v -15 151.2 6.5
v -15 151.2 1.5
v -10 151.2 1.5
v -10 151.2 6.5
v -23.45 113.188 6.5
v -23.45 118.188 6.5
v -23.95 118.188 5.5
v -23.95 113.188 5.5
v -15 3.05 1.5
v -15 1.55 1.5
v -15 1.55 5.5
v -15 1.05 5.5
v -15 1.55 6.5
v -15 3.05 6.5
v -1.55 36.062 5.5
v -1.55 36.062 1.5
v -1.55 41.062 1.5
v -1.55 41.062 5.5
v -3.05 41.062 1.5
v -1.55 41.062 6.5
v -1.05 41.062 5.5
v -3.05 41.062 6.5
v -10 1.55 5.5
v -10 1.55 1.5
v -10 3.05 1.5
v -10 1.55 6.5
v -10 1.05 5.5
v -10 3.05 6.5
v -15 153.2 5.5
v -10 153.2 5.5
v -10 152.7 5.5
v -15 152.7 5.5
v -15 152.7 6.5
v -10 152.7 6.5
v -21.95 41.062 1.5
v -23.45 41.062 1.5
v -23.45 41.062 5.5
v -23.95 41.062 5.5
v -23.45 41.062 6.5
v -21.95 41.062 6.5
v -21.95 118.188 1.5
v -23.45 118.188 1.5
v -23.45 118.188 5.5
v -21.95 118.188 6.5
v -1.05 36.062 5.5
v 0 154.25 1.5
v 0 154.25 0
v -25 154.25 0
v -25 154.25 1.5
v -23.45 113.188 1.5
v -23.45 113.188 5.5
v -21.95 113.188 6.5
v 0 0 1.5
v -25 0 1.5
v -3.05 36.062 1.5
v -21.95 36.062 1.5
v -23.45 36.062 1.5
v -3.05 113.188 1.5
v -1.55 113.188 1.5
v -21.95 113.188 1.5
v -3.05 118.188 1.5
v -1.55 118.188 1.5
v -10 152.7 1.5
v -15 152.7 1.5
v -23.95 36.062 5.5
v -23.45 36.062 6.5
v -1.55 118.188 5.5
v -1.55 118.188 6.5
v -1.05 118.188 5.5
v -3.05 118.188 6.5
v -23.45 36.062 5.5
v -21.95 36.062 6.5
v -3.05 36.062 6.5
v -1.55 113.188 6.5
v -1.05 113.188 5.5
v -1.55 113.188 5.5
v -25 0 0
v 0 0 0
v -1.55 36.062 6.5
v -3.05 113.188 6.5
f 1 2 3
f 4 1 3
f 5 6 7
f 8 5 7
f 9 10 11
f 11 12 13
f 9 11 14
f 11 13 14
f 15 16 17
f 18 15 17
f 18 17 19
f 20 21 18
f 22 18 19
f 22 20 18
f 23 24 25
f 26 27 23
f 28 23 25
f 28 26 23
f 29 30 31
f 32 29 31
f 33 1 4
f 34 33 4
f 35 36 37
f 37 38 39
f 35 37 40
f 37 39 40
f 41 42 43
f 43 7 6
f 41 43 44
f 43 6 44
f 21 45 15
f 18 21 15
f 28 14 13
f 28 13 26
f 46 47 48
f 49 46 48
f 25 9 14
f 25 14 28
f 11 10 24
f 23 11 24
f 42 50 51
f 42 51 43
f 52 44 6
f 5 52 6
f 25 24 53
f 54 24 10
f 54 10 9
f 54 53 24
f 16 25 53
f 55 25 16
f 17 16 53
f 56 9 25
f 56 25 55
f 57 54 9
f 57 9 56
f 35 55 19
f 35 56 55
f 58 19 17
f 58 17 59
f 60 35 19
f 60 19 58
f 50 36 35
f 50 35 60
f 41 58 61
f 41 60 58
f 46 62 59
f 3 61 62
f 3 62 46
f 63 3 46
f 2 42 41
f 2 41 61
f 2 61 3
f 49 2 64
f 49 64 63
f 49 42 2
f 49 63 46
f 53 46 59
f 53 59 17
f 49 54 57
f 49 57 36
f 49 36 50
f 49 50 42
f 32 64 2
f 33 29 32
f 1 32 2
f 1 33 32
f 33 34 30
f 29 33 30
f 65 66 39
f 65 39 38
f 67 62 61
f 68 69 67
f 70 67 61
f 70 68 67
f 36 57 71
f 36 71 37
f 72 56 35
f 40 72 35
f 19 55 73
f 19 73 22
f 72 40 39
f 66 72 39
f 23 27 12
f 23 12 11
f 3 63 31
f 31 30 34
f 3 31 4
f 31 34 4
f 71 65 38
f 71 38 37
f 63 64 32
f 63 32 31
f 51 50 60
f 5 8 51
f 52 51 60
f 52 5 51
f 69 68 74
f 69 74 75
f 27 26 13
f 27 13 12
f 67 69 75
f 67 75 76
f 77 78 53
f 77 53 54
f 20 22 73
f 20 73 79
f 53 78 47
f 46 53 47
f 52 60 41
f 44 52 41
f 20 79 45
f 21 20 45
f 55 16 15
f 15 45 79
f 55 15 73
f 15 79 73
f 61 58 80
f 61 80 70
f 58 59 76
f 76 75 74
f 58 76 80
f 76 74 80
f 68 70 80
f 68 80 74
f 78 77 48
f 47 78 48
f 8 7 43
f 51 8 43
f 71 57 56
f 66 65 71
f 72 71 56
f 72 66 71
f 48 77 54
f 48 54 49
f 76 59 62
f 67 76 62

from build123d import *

# Parameters (mm, degrees)
SKETCH2_W            = 154.25
SKETCH2_H            = 25
BOSS_EXTRUDE1_DEPTH  = 1.5
SKETCH3_W            = 5
SKETCH3_H            = 1.5
BOSS_EXTRUDE2_DEPTH  = 5
BOSS_EXTRUDE3_DEPTH  = 5
SKETCH5_W            = 1.5
SKETCH5_H            = 5
BOSS_EXTRUDE4_DEPTH  = 5
BOSS_EXTRUDE5_DEPTH  = 5
MIRROR5_COPY_1_DEPTH = 5


with BuildPart() as part:
    # Sketch2 → Boss-Extrude1 (new body)
    with BuildSketch(Plane(origin=(0, 0, 0), x_dir=(0, 1, 0), z_dir=(0, 0, 1))):
        with Locations((77.125, 12.5)):
            Rectangle(SKETCH2_W, SKETCH2_H)
    extrude(amount=BOSS_EXTRUDE1_DEPTH)

    # Sketch3 → Boss-Extrude2 (add)
    with BuildSketch(Plane.XY.offset(1.5)):
        with Locations((-12.5, 2.3)):
            Rectangle(SKETCH3_W, SKETCH3_H)
    boss_extrude2 = extrude(amount=BOSS_EXTRUDE2_DEPTH)

    # Sketch4 → Boss-Extrude3 (add)
    with BuildSketch(Plane.YZ.offset(-10)):
        Polygon((1.55, 6.5), (1.05, 5.5), (1.55, 5.5), align=None)
    boss_extrude3 = extrude(amount=-BOSS_EXTRUDE3_DEPTH)

    # Sketch5 → Boss-Extrude4 (add)
    with BuildSketch(Plane.XY.offset(1.5)):
        with Locations((-2.3, 38.5625)):
            Rectangle(SKETCH5_W, SKETCH5_H)
        with Locations((-2.3, 115.6875)):
            Rectangle(SKETCH5_W, SKETCH5_H)
    boss_extrude4 = extrude(amount=BOSS_EXTRUDE4_DEPTH)

    # Sketch6 → Boss-Extrude5 (add)
    with BuildSketch(Plane.XZ.offset(-36.0625)):
        Polygon((-1.55, 6.5), (-1.05, 5.5), (-1.55, 5.5), align=None)
    boss_extrude5 = extrude(amount=-BOSS_EXTRUDE5_DEPTH)

    # Mirror2: Boss-Extrude5 across plane
    add(boss_extrude5.mirror(Plane(origin=(0, 77.125, 0), x_dir=(0, 0, 1), z_dir=(0, -1, 0))))

    # Mirror3: Boss-Extrude2 across plane
    add(boss_extrude2.mirror(Plane(origin=(0, 77.125, 0), x_dir=(0, 0, 1), z_dir=(0, -1, 0))))

    # Mirror4: Boss-Extrude3 across plane
    add(boss_extrude3.mirror(Plane(origin=(0, 77.125, 0), x_dir=(0, 0, 1), z_dir=(0, -1, 0))))

    # Mirror5: Boss-Extrude4, Boss-Extrude5 across plane
    add(boss_extrude4.mirror(Plane(origin=(-12.5, 0, 0), x_dir=(0, 0, 1), z_dir=(1, 0, 0))))
    add(boss_extrude5.mirror(Plane(origin=(-12.5, 0, 0), x_dir=(0, 0, 1), z_dir=(1, 0, 0))))

    # Mirror5 copy 1 sketch → Mirror5 copy 1 (add)
    with BuildSketch(Plane(origin=(-25, 118.1875, 0), x_dir=(-1, 0, 0), z_dir=(0, 1, 0))):
        Polygon((-1.55, 6.5), (-1.05, 5.5), (-1.55, 5.5), align=None)
    extrude(amount=-MIRROR5_COPY_1_DEPTH)


solid = part.part
